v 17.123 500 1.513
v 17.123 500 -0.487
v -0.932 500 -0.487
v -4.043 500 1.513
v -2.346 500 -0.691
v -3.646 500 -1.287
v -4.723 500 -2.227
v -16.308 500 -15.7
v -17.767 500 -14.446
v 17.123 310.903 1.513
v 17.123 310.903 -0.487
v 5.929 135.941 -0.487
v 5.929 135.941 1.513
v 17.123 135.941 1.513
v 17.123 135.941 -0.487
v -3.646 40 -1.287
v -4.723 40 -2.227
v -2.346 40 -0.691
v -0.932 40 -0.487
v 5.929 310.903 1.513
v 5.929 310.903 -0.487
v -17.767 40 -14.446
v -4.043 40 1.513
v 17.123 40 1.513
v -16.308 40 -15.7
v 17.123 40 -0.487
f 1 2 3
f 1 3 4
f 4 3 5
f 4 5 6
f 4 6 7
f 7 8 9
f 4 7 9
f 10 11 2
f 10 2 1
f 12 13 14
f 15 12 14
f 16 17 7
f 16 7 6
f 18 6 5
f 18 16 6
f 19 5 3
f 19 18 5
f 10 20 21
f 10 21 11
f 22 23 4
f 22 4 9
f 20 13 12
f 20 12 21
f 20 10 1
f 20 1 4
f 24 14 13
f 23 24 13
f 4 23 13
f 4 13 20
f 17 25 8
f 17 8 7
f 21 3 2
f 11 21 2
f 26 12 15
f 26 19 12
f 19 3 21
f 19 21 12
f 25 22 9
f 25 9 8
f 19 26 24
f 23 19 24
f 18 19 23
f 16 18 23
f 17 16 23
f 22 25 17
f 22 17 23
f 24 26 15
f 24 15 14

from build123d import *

# Parameters (mm, degrees)
EXTRUDE_START       = 40
EXTRUDE_1_DEPTH     = 460
SKETCH_2_W          = 13.894074778
SKETCH_2_H          = 174.961932369
CUT_EXTRUDE_1_DEPTH = 501.611575003


with BuildPart() as part:
    # Эскиз1 → Вытянуть1 (new body)
    with BuildSketch(Plane(origin=(0, 0, 0), x_dir=(1, 0, 0), z_dir=(0, 1, 0)).offset(EXTRUDE_START)):
        with BuildLine():
            Line((-17.766709847, 14.4460477), (-16.308397656, 15.700046652))
            Line((-16.308397656, 15.700046652), (-4.722880617, 2.226908794))
            ThreePointArc((-4.722880617, 2.226908794), (-3.017444081, 0.942662024), (-0.931762463, 0.48688167))
            Line((-0.931762463, 0.48688167), (17.122829042, 0.48688167))
            Line((17.122829042, 0.48688167), (17.122829042, -1.51311833))
            Line((17.122829042, -1.51311833), (-4.043463493, -1.51311833))
            Line((-4.043463493, -1.51311833), (-17.766709847, 14.4460477))
        make_face()
    extrude(amount=EXTRUDE_1_DEPTH)

    # Эскиз2 → Вырез-Вытянуть1 (cut, through all)
    with BuildSketch(Plane.XY.offset(1.51311833)):
        with Locations((12.875765805, 223.422280108)):
            Rectangle(SKETCH_2_W, SKETCH_2_H)
    extrude(amount=-CUT_EXTRUDE_1_DEPTH, mode=Mode.SUBTRACT)


solid = part.part
